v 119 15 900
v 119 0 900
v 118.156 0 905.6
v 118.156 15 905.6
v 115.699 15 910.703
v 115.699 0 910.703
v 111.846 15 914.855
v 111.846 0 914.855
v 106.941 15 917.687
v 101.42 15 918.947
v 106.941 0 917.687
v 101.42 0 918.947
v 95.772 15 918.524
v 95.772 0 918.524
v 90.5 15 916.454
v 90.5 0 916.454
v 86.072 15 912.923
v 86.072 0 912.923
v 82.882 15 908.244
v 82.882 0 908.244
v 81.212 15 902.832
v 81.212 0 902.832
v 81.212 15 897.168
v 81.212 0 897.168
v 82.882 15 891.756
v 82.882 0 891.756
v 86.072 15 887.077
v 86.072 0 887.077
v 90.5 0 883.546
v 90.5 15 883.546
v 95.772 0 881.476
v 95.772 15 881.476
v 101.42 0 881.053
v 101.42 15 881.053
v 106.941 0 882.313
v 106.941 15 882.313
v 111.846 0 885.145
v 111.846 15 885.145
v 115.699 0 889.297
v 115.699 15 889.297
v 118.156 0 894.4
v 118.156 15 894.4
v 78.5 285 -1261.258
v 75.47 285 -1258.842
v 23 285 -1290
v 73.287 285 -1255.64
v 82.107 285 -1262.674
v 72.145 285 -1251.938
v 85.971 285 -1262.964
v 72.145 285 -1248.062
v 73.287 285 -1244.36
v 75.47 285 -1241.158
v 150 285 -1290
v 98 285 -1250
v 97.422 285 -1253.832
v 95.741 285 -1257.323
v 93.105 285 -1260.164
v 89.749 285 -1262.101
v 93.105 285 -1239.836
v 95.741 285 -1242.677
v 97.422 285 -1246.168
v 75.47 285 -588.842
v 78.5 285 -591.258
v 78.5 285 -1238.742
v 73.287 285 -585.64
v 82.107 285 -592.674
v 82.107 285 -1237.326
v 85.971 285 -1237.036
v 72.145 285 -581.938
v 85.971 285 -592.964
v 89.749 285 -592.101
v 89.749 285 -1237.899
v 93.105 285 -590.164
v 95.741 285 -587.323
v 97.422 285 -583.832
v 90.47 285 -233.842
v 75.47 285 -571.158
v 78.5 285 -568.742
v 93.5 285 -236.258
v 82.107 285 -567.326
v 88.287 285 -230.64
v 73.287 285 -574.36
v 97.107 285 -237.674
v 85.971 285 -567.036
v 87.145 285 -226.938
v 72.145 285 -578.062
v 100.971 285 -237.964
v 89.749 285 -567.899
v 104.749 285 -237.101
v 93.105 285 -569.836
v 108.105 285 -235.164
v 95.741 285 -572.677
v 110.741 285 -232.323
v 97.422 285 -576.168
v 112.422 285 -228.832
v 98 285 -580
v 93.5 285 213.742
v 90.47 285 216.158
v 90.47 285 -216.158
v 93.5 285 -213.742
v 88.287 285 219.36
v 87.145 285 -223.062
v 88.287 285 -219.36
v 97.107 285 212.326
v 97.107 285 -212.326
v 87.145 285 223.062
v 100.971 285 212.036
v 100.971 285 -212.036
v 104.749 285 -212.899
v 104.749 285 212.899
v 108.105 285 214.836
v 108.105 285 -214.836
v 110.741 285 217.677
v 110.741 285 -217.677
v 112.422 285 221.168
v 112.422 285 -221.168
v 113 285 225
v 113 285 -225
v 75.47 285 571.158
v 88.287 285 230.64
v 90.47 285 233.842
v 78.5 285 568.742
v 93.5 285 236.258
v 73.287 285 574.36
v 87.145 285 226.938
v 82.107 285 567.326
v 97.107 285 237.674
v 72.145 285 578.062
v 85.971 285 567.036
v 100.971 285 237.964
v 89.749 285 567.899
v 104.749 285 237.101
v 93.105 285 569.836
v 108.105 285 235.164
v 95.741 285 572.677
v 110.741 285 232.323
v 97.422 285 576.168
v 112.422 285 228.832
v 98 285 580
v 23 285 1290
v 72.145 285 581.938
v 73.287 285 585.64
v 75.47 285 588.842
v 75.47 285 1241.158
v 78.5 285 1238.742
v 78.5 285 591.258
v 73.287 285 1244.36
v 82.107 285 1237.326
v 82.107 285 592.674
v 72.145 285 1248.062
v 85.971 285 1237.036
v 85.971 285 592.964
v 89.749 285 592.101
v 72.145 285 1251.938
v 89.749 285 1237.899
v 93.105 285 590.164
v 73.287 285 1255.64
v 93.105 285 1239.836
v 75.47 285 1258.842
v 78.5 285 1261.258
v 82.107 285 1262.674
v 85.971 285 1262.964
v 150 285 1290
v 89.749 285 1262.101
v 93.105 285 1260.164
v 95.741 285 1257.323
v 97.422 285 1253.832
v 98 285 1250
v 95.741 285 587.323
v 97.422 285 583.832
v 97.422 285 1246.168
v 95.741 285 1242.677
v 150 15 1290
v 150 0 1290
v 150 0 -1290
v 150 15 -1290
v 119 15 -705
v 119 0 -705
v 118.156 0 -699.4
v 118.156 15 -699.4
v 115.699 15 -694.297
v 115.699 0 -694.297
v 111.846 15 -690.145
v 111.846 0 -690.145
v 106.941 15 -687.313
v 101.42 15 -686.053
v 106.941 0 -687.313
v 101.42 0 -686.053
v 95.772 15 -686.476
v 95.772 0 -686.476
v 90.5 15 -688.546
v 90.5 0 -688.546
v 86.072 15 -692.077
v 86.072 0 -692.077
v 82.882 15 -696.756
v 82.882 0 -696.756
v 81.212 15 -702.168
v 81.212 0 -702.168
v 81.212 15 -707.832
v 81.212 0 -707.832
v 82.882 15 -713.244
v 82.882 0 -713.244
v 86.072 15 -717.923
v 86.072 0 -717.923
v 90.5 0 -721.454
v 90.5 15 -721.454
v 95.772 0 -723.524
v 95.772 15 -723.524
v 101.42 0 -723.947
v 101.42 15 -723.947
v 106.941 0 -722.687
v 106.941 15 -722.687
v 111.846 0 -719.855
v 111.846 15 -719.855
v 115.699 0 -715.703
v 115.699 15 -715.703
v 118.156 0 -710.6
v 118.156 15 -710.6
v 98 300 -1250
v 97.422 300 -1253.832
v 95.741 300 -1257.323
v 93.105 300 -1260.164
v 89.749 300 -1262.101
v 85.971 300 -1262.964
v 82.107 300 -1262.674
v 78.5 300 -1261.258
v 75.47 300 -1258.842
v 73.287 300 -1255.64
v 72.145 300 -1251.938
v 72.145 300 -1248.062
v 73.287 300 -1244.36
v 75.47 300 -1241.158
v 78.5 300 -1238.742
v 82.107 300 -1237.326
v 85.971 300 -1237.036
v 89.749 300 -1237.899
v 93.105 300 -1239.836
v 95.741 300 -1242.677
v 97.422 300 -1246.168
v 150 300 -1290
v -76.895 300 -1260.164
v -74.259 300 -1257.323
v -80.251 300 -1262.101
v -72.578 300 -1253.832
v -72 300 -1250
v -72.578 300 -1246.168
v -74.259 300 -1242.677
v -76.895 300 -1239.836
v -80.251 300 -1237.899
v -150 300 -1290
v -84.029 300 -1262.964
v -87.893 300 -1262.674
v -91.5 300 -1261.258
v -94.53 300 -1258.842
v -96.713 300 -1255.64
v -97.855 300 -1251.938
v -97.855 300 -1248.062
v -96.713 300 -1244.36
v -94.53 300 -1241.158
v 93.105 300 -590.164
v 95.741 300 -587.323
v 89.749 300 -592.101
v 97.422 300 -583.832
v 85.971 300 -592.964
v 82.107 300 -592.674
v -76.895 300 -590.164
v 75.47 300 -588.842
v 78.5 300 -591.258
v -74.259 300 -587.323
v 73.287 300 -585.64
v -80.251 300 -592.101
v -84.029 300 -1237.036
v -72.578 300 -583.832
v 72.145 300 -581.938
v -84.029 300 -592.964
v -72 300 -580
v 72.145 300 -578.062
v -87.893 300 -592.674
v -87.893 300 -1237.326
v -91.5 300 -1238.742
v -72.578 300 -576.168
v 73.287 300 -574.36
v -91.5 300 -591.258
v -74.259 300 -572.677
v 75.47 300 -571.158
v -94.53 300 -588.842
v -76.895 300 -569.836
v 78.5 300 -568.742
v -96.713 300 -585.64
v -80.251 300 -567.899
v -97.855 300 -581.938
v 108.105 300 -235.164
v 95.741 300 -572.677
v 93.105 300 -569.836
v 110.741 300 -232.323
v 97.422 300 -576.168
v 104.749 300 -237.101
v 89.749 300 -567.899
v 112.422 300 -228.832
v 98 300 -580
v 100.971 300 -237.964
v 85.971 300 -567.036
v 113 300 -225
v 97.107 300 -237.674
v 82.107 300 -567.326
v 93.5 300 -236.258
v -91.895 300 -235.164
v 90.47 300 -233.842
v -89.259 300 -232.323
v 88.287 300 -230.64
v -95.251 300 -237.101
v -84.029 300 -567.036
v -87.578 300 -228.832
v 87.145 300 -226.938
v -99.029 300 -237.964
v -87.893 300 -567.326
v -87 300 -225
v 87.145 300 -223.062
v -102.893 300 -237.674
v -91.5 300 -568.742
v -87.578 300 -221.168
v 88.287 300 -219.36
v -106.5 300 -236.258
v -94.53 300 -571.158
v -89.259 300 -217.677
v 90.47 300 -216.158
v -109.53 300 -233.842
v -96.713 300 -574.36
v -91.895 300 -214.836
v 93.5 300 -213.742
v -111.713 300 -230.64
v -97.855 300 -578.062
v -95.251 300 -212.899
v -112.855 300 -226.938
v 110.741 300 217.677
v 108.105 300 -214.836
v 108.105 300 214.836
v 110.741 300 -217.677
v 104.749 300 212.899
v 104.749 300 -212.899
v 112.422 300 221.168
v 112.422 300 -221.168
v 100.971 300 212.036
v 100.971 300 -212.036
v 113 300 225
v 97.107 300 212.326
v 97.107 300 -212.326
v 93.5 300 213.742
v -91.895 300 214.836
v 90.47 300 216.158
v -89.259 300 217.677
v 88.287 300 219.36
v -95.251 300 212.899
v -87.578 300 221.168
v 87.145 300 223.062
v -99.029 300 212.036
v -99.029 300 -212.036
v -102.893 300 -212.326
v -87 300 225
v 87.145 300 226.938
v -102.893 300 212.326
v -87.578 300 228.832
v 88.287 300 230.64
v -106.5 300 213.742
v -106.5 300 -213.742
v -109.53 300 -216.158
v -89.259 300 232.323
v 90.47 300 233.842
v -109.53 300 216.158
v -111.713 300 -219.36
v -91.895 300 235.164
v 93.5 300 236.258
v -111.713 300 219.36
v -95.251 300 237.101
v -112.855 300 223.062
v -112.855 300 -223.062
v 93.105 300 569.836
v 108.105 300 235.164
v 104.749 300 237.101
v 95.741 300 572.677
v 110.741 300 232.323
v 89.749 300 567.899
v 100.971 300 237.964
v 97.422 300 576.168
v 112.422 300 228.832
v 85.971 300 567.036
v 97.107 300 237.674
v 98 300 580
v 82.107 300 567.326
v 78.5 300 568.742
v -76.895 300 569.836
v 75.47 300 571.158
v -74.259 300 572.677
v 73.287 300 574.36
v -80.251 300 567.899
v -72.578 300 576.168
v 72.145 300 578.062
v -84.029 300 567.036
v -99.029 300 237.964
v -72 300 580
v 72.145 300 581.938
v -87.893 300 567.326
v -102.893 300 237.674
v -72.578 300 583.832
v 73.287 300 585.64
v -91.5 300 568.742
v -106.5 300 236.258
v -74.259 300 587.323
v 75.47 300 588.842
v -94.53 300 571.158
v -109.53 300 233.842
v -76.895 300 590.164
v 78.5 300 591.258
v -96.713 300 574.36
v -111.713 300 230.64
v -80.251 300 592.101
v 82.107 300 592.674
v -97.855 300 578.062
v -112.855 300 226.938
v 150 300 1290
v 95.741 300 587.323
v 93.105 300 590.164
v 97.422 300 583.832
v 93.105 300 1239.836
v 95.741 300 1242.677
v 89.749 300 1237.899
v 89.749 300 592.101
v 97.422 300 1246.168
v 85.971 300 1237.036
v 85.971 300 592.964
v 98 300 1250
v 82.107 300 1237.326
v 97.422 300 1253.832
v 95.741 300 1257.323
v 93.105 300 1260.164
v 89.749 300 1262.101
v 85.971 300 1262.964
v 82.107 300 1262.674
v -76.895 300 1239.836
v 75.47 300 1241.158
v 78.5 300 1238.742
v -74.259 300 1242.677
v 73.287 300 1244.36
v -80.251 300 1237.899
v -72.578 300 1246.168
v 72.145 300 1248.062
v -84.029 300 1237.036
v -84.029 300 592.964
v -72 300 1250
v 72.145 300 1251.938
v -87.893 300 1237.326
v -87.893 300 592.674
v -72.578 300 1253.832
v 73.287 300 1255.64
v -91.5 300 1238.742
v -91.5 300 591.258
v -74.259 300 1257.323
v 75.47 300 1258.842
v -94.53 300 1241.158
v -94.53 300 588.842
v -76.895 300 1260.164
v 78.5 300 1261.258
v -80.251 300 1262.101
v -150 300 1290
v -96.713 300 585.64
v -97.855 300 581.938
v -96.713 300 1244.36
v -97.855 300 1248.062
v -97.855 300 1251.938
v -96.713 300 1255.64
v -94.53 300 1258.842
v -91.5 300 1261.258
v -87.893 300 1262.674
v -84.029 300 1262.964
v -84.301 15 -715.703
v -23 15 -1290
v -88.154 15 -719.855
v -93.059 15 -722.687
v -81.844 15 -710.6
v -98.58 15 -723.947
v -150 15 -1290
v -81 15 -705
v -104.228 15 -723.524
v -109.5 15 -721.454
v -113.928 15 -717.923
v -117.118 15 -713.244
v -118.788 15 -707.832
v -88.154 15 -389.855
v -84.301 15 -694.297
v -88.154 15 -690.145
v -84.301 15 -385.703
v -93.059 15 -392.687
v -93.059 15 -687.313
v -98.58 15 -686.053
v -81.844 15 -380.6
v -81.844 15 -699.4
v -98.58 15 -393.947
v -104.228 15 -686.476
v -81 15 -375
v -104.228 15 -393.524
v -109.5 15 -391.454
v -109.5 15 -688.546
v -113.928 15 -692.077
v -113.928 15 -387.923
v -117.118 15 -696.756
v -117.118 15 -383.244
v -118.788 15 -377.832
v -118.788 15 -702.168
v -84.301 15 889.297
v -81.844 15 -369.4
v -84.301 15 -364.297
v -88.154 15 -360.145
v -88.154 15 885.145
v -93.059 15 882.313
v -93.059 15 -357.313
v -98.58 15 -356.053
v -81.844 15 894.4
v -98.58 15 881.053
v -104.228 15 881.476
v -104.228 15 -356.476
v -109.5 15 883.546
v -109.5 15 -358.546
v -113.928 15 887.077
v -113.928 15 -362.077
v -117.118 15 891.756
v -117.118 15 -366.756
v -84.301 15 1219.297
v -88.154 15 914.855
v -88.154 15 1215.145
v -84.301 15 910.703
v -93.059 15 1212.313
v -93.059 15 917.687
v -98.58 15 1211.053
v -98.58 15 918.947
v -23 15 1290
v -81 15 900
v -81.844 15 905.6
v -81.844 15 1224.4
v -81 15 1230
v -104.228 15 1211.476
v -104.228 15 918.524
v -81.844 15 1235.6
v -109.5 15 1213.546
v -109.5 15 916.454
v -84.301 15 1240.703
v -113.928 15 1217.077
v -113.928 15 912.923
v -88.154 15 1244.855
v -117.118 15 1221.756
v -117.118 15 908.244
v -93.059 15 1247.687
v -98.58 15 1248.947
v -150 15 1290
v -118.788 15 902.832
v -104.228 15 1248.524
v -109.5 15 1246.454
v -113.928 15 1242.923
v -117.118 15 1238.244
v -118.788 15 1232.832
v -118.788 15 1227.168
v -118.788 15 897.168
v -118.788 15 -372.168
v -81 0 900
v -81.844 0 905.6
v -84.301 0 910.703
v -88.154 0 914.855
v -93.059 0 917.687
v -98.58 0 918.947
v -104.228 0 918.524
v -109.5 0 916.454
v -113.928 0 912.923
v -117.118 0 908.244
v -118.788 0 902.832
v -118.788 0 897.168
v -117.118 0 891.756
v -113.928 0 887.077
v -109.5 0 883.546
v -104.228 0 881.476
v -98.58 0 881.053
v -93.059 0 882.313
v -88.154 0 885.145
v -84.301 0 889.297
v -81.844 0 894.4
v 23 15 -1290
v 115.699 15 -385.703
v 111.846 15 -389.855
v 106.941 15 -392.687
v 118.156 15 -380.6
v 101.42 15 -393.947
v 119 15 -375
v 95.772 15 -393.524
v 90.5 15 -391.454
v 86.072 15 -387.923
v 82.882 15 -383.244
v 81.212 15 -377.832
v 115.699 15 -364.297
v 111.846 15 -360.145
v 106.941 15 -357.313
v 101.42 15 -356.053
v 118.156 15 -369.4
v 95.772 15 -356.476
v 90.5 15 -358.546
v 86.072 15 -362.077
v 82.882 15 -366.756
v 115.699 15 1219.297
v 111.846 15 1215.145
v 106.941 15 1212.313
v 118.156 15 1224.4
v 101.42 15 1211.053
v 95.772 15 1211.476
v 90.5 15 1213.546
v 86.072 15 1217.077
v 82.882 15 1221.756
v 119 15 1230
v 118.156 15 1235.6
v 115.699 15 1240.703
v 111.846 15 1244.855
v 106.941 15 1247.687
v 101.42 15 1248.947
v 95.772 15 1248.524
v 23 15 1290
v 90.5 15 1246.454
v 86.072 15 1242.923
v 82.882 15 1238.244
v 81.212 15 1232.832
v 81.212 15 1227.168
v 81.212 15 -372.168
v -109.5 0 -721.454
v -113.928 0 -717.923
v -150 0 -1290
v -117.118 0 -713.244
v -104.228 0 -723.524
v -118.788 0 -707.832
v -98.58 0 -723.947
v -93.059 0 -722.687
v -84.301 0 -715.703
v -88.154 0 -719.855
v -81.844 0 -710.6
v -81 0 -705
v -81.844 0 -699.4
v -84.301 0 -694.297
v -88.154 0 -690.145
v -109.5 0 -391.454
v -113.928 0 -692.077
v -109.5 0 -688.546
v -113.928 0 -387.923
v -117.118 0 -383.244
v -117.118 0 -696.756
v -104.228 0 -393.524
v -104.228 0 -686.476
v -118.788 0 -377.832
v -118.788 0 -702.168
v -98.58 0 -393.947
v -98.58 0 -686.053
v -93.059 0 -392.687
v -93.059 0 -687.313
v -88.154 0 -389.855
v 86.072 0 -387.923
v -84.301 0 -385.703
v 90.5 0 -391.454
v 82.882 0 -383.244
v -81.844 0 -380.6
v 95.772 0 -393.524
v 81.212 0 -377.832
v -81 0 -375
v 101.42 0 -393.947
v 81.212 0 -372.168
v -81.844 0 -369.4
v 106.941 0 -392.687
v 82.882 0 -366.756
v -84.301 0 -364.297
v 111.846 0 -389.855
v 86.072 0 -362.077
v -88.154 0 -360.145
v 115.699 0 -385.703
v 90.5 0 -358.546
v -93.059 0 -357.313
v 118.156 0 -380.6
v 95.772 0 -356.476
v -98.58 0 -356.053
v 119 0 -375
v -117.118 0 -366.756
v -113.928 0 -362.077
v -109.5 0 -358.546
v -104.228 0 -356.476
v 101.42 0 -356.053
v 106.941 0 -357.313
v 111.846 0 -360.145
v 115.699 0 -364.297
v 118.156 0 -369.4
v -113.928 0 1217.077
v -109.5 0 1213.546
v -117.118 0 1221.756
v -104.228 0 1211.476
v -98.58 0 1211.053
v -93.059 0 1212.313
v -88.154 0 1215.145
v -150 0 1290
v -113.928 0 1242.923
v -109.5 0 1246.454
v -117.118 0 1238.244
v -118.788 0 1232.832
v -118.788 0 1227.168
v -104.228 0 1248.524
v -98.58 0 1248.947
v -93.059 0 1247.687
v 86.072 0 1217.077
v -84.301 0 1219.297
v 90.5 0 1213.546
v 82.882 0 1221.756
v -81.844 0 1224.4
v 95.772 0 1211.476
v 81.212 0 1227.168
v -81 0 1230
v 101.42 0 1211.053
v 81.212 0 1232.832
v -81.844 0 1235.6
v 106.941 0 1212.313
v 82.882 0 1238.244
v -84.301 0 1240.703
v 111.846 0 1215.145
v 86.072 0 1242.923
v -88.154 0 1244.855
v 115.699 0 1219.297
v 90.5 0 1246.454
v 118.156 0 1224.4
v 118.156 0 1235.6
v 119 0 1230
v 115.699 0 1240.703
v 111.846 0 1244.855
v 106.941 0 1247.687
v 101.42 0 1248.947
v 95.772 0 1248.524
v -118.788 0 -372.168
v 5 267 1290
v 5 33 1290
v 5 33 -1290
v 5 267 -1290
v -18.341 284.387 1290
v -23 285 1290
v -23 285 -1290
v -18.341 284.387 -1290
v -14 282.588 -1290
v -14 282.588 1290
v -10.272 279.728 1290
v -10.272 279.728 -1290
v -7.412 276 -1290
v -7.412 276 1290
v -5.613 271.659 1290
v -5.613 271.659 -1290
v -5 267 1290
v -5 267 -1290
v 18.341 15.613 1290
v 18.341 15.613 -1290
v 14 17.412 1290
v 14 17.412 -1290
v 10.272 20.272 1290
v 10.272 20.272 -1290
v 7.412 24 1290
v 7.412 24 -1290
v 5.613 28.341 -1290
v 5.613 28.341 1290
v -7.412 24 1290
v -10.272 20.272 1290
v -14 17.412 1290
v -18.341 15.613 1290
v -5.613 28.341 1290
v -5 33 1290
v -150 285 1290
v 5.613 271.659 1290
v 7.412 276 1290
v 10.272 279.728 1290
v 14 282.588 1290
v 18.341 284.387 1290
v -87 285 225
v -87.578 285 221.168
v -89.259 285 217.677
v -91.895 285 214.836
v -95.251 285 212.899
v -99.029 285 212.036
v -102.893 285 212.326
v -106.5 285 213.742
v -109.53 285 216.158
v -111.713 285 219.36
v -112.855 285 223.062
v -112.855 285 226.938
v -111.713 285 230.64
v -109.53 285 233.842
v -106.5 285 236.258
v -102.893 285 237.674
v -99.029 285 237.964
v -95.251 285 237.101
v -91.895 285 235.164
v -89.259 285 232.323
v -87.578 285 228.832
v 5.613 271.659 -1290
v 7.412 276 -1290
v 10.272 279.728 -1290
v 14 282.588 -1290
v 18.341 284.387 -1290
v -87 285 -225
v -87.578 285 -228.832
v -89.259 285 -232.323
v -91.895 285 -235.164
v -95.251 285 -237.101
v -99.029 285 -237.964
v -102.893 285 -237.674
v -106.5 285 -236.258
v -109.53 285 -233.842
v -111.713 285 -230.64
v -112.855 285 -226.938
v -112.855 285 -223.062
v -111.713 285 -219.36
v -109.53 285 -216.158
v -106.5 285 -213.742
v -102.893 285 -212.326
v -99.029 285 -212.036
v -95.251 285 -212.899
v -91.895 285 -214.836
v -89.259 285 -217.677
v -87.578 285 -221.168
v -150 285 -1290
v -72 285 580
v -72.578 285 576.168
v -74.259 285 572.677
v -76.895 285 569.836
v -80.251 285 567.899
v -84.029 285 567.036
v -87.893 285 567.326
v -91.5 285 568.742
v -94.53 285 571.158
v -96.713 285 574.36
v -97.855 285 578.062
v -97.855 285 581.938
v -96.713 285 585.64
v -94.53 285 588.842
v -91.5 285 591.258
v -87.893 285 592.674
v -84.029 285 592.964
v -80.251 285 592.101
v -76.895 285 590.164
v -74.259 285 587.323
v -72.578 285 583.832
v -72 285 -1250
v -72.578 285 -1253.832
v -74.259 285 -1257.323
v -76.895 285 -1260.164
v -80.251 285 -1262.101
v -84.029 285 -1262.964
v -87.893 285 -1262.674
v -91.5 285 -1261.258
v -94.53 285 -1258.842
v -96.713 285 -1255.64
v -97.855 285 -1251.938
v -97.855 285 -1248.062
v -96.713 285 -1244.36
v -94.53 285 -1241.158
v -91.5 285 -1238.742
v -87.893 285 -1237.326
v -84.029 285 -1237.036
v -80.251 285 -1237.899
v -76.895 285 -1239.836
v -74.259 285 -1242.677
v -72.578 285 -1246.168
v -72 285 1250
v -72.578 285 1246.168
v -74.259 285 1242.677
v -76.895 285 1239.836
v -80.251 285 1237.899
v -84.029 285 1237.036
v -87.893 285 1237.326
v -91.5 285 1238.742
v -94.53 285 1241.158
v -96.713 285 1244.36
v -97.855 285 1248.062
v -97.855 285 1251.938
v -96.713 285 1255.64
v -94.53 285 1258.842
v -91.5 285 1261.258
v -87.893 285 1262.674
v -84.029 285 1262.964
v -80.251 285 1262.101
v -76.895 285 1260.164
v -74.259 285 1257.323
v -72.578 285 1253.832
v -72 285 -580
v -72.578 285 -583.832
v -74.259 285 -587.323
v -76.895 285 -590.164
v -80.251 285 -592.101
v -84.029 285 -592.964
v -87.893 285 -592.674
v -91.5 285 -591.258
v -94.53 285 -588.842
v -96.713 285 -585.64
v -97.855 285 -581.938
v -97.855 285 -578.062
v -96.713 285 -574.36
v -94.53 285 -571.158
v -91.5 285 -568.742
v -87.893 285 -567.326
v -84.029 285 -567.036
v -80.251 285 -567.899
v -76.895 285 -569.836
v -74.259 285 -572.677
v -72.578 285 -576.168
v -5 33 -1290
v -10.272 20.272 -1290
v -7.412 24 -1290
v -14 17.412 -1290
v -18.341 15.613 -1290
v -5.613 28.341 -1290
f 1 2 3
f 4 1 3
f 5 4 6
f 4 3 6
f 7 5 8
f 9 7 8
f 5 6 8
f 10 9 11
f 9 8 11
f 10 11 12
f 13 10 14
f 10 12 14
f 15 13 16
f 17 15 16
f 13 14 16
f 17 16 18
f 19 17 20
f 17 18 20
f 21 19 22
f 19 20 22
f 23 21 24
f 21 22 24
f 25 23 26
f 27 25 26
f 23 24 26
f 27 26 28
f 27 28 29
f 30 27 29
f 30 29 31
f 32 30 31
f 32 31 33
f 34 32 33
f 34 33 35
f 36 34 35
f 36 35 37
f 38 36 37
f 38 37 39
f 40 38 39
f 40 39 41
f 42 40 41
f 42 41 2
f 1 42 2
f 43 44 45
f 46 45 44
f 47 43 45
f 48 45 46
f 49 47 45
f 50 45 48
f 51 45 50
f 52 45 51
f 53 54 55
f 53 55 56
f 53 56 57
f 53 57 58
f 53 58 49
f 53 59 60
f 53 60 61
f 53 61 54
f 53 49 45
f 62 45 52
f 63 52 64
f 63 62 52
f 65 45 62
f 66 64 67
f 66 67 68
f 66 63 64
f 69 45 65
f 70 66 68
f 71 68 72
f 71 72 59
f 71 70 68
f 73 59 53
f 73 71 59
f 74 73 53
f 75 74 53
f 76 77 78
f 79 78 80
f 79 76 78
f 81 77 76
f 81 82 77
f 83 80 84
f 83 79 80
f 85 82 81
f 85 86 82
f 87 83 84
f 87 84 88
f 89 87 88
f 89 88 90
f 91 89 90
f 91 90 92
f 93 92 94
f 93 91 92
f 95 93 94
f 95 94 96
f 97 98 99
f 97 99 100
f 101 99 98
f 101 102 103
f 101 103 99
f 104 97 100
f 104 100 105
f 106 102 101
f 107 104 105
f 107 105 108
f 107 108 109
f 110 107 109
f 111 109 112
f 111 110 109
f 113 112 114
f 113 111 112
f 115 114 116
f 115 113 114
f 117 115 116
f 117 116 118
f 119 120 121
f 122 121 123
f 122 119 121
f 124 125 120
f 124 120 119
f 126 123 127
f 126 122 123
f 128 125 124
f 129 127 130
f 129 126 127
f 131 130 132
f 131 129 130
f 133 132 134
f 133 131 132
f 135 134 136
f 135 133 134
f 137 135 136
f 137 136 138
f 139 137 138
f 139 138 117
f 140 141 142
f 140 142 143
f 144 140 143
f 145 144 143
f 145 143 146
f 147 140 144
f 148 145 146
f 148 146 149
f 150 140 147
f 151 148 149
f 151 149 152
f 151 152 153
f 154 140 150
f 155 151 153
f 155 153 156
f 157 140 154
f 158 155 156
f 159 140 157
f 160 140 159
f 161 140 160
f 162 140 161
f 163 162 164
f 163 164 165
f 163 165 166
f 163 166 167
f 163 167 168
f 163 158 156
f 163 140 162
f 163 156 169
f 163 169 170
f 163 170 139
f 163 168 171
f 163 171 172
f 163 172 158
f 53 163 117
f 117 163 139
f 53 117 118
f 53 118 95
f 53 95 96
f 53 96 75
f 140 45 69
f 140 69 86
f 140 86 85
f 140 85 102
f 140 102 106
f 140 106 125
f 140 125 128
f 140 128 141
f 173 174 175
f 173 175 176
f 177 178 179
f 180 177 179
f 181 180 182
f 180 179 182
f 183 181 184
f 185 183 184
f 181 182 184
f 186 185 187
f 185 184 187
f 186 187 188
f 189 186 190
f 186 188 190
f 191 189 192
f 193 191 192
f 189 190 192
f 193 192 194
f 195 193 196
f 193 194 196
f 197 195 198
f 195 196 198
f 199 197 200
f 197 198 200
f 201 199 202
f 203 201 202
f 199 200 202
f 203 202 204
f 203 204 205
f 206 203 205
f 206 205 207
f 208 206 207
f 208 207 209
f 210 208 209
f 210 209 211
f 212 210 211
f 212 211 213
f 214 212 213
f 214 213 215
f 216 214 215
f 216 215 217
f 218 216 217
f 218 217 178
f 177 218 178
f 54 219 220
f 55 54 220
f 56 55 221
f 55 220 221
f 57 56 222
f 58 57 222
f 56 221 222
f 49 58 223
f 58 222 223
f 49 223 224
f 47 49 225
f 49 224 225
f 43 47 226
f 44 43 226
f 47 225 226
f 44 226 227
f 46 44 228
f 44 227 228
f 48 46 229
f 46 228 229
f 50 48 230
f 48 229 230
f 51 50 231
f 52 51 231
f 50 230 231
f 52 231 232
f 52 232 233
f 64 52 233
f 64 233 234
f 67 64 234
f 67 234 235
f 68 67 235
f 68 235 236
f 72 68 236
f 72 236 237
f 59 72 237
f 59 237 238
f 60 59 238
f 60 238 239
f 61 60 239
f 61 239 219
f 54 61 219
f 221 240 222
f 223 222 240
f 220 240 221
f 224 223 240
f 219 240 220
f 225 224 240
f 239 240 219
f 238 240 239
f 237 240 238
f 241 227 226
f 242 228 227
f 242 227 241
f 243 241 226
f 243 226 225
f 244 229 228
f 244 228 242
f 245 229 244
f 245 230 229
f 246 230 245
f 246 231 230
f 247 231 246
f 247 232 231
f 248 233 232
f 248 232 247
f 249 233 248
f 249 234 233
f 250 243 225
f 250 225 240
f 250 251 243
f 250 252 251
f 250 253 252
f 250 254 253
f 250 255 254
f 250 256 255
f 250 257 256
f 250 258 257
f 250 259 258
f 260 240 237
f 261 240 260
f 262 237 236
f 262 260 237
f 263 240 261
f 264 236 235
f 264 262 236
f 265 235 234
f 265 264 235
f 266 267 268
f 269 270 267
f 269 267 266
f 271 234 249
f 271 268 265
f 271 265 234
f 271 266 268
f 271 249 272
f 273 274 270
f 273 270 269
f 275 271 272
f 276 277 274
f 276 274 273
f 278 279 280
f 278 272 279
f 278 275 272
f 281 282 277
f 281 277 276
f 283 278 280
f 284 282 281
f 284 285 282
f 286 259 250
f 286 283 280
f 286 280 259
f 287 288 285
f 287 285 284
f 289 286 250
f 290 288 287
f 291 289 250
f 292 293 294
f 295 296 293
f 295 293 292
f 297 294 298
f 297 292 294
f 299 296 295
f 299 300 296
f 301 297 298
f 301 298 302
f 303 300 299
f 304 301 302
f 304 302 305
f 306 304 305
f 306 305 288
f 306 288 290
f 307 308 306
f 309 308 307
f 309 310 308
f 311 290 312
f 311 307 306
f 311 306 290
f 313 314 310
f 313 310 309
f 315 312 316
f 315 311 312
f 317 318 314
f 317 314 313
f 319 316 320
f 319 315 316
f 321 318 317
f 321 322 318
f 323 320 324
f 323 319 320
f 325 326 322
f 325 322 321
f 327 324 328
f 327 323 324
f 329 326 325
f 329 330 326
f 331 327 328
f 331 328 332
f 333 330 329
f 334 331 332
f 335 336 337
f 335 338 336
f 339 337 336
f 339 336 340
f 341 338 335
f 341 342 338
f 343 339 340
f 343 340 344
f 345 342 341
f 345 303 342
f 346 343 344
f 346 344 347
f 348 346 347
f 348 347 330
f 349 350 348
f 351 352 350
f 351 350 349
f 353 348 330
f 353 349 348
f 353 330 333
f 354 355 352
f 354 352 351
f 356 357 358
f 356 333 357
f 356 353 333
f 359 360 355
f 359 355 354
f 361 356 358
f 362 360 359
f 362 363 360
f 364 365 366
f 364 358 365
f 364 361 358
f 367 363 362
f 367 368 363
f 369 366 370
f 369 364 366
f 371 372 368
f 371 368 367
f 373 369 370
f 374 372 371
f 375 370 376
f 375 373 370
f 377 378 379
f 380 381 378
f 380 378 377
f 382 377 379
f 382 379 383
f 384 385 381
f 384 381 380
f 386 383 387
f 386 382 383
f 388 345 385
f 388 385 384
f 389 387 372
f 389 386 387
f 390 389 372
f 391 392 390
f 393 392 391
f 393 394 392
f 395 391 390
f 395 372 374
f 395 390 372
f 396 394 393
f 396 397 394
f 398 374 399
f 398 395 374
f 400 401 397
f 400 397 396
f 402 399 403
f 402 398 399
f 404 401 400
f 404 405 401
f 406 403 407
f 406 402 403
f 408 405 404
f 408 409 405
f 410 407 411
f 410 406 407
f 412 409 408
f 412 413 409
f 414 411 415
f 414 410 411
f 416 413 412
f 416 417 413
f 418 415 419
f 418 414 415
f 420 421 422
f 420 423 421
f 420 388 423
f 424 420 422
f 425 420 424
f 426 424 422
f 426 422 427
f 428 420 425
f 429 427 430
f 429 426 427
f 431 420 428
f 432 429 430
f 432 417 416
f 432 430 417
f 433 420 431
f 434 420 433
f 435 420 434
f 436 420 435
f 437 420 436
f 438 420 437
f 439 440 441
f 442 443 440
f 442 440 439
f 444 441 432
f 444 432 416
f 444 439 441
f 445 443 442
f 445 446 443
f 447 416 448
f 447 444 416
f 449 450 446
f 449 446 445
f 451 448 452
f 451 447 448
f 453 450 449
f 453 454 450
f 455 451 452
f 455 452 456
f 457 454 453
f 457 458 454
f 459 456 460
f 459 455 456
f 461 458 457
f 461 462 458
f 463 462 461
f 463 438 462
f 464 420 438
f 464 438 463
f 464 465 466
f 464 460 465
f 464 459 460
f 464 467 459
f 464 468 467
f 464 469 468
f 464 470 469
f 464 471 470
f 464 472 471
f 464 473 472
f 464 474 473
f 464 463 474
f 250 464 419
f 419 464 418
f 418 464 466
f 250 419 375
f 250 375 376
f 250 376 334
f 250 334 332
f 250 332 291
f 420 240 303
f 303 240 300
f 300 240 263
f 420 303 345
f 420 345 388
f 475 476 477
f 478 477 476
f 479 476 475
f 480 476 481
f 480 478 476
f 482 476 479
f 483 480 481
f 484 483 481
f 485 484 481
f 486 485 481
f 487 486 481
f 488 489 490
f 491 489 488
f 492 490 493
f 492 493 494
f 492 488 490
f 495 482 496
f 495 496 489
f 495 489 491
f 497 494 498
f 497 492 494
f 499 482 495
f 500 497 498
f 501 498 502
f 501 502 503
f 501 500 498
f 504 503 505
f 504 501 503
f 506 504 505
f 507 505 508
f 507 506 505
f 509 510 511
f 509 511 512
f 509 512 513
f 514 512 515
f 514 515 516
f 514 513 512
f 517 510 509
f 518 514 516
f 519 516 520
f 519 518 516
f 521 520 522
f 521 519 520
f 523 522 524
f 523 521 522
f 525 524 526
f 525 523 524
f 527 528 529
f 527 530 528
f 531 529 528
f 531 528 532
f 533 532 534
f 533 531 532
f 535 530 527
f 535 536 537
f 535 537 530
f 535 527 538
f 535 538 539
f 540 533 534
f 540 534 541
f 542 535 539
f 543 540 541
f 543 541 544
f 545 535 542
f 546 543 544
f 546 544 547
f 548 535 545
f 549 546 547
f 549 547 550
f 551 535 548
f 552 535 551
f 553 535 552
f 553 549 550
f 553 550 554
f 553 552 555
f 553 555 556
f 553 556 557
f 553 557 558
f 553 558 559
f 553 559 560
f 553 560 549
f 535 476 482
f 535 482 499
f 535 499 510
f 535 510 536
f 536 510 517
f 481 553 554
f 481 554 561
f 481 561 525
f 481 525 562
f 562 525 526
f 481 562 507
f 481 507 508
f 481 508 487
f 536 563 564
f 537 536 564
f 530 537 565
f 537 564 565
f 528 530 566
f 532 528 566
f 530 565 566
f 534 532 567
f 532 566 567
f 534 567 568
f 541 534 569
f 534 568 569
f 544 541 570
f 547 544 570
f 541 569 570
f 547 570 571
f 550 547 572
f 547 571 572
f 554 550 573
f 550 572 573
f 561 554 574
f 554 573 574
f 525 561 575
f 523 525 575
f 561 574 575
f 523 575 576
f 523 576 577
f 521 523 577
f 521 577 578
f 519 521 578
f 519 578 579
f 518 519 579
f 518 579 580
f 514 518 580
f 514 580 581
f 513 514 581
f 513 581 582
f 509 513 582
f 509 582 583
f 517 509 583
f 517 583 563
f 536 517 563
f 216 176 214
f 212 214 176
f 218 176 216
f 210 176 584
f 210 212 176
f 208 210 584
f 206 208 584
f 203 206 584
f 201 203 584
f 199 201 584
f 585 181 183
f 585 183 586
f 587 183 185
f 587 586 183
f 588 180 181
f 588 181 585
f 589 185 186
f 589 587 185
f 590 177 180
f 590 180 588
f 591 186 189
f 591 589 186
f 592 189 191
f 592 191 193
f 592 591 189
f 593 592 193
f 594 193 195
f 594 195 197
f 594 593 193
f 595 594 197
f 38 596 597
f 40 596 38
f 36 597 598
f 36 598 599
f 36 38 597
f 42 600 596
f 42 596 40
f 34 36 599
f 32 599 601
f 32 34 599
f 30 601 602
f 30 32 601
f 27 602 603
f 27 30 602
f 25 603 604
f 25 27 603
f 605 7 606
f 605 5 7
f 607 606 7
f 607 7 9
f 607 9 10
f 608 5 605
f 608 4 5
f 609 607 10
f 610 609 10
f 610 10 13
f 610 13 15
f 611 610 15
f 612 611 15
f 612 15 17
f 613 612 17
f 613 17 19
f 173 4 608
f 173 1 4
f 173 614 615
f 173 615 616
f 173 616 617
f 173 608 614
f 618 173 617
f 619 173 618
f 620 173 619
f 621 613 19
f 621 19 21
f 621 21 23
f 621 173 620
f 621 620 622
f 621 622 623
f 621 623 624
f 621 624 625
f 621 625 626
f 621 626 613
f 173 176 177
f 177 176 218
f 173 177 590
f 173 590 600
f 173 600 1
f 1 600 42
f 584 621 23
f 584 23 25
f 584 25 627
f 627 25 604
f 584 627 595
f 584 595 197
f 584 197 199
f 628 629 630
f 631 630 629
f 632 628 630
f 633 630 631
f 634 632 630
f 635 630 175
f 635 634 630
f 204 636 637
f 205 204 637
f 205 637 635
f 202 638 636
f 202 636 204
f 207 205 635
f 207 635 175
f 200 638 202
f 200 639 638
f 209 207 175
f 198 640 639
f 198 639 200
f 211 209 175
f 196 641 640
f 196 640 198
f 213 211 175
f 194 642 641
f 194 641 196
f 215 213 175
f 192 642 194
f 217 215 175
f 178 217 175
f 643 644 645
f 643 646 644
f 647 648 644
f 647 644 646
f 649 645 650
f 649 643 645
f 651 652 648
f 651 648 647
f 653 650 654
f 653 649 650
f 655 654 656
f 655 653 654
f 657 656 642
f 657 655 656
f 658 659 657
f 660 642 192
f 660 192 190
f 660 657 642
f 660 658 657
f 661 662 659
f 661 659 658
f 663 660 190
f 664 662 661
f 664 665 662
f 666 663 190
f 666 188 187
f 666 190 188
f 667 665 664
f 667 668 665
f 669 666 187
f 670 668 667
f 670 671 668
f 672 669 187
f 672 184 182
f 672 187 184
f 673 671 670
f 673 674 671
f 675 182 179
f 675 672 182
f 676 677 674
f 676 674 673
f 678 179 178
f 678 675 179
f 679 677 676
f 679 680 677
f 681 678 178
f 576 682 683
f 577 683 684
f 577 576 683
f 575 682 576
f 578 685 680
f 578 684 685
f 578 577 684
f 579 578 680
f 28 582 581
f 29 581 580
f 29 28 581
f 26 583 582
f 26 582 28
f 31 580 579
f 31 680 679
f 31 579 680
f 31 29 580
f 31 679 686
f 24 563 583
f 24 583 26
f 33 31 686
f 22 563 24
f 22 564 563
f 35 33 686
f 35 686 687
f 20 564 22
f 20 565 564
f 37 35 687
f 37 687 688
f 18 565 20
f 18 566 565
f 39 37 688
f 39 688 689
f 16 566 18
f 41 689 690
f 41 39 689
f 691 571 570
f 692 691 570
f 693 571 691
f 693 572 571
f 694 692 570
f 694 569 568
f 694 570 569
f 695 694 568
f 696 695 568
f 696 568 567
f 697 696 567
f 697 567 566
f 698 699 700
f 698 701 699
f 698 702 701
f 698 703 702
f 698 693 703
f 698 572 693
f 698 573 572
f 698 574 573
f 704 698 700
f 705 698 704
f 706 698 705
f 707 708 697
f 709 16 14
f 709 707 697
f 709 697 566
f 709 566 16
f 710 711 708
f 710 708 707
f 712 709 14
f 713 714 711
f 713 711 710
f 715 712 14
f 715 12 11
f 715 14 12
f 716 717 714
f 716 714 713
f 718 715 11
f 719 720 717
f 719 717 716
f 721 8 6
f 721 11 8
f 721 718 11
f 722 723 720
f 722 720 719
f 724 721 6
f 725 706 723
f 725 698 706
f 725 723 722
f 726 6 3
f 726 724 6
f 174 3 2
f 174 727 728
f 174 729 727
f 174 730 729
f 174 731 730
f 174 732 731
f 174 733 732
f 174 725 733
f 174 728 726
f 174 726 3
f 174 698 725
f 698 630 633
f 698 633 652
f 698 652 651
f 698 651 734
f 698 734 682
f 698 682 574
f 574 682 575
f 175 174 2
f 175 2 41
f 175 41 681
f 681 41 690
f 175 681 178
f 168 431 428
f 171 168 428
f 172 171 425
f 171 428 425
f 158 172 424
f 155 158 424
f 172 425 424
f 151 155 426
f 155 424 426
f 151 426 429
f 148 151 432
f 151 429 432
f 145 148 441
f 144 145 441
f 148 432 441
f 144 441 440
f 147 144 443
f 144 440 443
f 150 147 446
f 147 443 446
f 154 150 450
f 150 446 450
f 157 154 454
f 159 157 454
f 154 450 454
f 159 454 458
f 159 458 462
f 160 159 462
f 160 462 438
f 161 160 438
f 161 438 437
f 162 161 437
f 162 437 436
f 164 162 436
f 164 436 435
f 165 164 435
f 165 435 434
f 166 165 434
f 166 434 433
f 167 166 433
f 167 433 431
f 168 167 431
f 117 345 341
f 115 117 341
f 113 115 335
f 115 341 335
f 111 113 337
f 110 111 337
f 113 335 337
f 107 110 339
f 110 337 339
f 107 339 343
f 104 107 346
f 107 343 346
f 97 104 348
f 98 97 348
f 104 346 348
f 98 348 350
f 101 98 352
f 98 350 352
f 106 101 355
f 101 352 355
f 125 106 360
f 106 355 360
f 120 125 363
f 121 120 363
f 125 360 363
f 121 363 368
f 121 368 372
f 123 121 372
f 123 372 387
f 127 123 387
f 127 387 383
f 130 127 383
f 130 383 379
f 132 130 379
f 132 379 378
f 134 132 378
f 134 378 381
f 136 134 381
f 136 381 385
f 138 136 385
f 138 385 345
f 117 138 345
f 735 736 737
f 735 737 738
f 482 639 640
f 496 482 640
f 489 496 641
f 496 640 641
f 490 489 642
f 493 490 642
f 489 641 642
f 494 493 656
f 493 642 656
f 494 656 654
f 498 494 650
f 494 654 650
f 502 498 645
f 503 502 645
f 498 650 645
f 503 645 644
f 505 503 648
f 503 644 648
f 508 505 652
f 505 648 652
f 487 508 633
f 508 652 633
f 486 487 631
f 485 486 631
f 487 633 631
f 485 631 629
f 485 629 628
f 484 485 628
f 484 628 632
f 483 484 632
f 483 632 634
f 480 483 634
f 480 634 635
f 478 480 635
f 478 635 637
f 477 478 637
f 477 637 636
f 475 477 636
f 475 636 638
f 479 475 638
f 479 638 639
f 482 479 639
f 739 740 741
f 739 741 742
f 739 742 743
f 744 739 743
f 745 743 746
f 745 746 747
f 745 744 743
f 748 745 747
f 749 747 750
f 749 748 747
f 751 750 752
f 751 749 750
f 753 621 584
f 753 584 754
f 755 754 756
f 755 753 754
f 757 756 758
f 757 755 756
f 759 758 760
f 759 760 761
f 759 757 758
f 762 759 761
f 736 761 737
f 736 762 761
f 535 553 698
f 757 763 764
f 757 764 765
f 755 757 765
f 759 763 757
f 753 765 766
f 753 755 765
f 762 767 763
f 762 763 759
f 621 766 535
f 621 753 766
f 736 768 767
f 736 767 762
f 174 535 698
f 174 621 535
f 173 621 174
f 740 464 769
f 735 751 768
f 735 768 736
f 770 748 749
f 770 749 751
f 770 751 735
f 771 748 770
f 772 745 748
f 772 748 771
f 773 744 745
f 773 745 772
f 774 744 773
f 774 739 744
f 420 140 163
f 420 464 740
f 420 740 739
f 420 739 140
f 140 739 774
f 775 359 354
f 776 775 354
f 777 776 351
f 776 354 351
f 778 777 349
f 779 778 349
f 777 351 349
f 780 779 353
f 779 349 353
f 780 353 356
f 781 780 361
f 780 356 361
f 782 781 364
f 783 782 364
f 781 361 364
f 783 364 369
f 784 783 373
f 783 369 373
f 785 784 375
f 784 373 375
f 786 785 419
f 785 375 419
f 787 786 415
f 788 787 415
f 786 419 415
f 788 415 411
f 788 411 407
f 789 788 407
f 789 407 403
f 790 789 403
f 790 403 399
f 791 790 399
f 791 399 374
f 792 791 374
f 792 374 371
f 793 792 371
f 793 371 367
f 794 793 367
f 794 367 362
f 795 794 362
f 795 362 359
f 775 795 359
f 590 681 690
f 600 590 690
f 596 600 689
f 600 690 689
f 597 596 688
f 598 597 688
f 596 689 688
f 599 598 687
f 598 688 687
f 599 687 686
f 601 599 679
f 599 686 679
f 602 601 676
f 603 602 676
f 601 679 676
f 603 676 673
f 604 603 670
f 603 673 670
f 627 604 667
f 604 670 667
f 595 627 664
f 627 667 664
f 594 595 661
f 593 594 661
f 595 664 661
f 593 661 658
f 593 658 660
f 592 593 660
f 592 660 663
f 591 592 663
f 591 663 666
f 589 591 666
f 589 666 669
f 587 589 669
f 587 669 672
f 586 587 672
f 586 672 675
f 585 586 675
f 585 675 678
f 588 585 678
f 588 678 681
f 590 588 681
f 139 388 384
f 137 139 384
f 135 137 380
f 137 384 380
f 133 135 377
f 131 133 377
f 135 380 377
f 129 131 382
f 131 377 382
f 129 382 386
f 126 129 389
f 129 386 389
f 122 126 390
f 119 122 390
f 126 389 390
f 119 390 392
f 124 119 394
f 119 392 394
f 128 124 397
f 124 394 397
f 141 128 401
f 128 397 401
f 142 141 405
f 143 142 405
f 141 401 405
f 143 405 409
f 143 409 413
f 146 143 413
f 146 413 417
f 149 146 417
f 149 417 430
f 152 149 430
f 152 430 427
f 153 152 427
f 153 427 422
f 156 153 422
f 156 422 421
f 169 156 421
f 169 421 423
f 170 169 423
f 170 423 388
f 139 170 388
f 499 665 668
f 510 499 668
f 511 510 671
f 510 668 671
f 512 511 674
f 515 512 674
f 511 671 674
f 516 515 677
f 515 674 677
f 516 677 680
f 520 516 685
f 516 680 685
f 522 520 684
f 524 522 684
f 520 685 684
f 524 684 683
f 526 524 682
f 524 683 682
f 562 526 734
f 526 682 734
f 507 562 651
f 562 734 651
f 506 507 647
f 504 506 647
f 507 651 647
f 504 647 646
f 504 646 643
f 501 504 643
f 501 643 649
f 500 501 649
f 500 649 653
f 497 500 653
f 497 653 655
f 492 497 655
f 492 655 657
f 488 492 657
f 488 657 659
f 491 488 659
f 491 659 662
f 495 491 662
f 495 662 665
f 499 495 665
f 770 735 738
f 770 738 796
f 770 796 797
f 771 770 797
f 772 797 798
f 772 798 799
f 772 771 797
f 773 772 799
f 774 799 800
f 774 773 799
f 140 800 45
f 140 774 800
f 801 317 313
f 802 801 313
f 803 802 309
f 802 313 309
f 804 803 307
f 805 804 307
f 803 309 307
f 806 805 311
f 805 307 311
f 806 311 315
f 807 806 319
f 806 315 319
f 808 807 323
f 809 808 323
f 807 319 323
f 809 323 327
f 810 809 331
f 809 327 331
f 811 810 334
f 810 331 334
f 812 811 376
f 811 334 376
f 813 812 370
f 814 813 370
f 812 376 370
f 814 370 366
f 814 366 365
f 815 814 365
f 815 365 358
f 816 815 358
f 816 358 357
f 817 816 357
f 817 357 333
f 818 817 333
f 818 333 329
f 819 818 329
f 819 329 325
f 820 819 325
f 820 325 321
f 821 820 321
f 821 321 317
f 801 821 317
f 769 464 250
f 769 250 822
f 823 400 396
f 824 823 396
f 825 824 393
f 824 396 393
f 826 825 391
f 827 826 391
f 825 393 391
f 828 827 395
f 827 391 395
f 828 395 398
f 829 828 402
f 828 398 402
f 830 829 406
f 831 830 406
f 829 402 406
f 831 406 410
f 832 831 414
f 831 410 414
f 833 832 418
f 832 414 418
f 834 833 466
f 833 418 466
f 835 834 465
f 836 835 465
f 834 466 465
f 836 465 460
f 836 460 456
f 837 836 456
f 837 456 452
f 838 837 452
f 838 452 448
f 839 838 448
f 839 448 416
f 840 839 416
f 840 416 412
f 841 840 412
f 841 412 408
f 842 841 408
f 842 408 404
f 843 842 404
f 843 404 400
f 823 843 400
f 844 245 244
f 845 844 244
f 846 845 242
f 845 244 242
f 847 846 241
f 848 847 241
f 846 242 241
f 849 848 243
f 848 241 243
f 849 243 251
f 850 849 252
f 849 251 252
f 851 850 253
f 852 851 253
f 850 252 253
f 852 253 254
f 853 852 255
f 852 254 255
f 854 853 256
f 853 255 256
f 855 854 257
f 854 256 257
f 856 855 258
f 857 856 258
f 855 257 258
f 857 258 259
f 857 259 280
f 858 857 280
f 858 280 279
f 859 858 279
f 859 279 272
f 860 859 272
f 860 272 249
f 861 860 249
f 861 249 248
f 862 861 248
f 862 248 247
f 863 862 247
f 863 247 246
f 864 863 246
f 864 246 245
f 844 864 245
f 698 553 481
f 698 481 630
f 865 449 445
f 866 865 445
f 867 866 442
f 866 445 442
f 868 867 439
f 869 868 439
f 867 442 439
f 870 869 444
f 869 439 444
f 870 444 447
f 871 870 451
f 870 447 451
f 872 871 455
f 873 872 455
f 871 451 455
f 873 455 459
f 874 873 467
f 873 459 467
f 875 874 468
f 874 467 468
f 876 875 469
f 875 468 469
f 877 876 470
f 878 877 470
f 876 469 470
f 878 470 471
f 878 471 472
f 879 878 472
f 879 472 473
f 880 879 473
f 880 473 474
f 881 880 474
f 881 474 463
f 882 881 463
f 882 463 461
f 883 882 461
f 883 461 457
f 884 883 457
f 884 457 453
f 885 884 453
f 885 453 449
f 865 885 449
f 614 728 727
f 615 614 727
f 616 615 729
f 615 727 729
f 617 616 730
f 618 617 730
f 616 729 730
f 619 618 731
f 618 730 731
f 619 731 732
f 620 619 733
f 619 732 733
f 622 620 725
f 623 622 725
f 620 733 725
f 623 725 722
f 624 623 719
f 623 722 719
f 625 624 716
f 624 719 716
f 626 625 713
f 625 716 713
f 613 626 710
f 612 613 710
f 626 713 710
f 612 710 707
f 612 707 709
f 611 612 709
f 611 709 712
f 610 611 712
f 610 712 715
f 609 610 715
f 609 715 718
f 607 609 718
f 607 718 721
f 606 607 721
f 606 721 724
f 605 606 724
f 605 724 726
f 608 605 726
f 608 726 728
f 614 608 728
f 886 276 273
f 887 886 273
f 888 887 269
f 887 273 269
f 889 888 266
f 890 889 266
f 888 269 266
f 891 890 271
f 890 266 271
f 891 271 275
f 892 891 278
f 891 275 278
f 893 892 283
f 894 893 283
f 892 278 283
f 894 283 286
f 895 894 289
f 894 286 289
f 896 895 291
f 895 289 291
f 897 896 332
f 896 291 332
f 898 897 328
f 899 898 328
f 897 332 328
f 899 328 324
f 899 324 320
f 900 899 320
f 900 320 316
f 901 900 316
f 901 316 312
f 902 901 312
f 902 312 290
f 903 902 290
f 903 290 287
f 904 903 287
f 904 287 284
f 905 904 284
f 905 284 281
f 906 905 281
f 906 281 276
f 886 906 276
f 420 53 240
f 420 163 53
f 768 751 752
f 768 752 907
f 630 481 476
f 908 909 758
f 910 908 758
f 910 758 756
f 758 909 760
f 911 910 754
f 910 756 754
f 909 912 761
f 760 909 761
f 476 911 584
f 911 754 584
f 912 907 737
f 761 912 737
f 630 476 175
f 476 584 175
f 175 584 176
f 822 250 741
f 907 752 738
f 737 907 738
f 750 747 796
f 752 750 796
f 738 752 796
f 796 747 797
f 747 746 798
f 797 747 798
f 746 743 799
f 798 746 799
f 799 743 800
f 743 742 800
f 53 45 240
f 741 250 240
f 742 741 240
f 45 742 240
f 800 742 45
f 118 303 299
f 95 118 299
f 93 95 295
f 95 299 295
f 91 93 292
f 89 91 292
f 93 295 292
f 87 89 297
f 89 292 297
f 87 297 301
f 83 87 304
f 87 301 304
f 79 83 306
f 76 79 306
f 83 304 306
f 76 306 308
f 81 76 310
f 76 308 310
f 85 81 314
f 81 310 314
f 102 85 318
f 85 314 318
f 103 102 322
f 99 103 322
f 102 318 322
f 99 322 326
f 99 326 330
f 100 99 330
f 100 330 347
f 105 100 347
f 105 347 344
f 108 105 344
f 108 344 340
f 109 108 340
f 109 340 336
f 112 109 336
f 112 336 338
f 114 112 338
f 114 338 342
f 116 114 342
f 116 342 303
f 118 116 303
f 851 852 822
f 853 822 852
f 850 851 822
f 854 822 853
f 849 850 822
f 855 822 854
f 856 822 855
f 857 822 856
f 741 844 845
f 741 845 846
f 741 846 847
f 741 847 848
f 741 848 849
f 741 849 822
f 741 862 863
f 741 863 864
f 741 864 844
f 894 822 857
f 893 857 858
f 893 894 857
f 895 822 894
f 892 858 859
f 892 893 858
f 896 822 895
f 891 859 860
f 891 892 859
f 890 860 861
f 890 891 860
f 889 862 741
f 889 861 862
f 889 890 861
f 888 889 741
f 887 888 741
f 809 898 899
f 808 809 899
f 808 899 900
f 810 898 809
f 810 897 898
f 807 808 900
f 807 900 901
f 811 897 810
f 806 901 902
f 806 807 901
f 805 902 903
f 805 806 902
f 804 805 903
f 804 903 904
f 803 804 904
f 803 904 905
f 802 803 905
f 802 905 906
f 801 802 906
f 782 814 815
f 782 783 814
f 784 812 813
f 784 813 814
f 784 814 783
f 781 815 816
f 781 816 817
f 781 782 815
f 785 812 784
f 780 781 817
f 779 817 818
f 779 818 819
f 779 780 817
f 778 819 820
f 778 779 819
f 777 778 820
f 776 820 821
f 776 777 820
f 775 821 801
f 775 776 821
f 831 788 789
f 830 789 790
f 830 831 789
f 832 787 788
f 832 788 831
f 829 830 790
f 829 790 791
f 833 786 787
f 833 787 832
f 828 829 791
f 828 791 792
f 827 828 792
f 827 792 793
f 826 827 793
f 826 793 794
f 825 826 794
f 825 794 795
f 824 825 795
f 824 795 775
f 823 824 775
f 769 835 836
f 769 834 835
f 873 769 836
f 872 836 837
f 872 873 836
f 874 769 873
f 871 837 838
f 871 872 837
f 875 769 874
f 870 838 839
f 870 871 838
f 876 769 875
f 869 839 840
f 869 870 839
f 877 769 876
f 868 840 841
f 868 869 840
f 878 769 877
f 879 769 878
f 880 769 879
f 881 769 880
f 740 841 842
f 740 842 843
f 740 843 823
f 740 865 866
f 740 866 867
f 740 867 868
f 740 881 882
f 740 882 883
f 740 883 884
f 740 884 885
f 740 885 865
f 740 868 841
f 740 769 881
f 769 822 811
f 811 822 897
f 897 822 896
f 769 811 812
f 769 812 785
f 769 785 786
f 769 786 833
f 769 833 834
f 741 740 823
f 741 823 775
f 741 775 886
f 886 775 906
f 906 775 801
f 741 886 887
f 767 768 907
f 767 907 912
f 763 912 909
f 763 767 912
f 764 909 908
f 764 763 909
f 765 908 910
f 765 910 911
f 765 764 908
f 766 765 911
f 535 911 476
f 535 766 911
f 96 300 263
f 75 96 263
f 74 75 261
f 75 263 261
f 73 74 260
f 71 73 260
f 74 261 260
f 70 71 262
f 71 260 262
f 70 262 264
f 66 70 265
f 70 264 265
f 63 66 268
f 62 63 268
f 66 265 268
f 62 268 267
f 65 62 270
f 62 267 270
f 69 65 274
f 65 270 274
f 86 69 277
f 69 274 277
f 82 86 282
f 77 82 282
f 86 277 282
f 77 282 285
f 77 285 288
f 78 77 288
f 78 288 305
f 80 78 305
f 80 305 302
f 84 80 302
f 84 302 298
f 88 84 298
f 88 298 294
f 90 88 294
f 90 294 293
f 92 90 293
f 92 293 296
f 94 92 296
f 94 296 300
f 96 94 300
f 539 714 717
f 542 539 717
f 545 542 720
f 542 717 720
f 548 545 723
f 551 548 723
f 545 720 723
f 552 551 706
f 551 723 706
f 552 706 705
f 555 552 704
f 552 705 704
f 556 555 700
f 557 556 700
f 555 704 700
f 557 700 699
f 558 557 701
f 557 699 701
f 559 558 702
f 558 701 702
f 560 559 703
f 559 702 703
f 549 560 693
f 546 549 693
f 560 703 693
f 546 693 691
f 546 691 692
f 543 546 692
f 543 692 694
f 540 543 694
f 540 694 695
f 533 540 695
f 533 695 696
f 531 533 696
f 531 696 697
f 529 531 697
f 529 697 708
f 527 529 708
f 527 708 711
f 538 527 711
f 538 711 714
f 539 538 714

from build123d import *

# Parameters (mm, degrees)
EXTRUDE_1_DEPTH     = 1290
SKETCH_2_R          = 19
CUT_EXTRUDE_1_DEPTH = 60
SKETCH_3_R          = 13
CUT_EXTRUDE_2_DEPTH = 60


with BuildPart() as part:
    # Эскиз1 → Бобышка-Вытянуть1 (new body, symmetric)
    with BuildSketch(Plane.XY):
        with BuildLine():
            Line((150, 300), (-150, 300))
            Line((-150, 300), (-150, 285))
            Line((-150, 285), (-23, 285))
            ThreePointArc((-23, 285), (-10.272077939, 279.727922061), (-5, 267))
            Line((-5, 267), (-5, 33))
            ThreePointArc((-5, 33), (-10.272077939, 20.272077939), (-23, 15))
            Line((-23, 15), (-150, 15))
            Line((-150, 15), (-150, 0))
            Line((-150, 0), (150, 0))
            Line((150, 0), (150, 15))
            Line((150, 15), (23, 15))
            ThreePointArc((23, 15), (10.272077939, 20.272077939), (5, 33))
            Line((5, 33), (5, 267))
            ThreePointArc((5, 267), (10.272077939, 279.727922061), (23, 285))
            Line((23, 285), (150, 285))
            Line((150, 285), (150, 300))
        make_face()
    extrude(amount=EXTRUDE_1_DEPTH, both=True)

    # Эскиз2 → Вырез-Вытянуть1 (cut)
    with BuildSketch(Plane.XZ):
        with Locations((-100, 1230)):
            Circle(SKETCH_2_R)
        with Locations((100, 1230)):
            Circle(SKETCH_2_R)
        with Locations((-100, 900)):
            Circle(SKETCH_2_R)
        with Locations((100, 900)):
            Circle(SKETCH_2_R)
        with Locations((-100, -705)):
            Circle(SKETCH_2_R)
        with Locations((100, -705)):
            Circle(SKETCH_2_R)
        with Locations((-100, -375)):
            Circle(SKETCH_2_R)
        with Locations((100, -375)):
            Circle(SKETCH_2_R)
    extrude(amount=-CUT_EXTRUDE_1_DEPTH, mode=Mode.SUBTRACT)

    # Эскиз3 → Вырез-Вытянуть2 (cut)
    with BuildSketch(Plane(origin=(0, 300, 0), x_dir=(1, 0, 0), z_dir=(0, 1, 0))):
        with Locations((-85, -1250)):
            Circle(SKETCH_3_R)
        with Locations((85, -1250)):
            Circle(SKETCH_3_R)
        with Locations((-85, -580)):
            Circle(SKETCH_3_R)
        with Locations((85, -580)):
            Circle(SKETCH_3_R)
        with Locations((-100, -225)):
            Circle(SKETCH_3_R)
        with Locations((100, -225)):
            Circle(SKETCH_3_R)
        with Locations((-100, 225)):
            Circle(SKETCH_3_R)
        with Locations((100, 225)):
            Circle(SKETCH_3_R)
        with Locations((-85, 580)):
            Circle(SKETCH_3_R)
        with Locations((85, 580)):
            Circle(SKETCH_3_R)
        with Locations((-85, 1250)):
            Circle(SKETCH_3_R)
        with Locations((85, 1250)):
            Circle(SKETCH_3_R)
    extrude(amount=-CUT_EXTRUDE_2_DEPTH, mode=Mode.SUBTRACT)


solid = part.part
